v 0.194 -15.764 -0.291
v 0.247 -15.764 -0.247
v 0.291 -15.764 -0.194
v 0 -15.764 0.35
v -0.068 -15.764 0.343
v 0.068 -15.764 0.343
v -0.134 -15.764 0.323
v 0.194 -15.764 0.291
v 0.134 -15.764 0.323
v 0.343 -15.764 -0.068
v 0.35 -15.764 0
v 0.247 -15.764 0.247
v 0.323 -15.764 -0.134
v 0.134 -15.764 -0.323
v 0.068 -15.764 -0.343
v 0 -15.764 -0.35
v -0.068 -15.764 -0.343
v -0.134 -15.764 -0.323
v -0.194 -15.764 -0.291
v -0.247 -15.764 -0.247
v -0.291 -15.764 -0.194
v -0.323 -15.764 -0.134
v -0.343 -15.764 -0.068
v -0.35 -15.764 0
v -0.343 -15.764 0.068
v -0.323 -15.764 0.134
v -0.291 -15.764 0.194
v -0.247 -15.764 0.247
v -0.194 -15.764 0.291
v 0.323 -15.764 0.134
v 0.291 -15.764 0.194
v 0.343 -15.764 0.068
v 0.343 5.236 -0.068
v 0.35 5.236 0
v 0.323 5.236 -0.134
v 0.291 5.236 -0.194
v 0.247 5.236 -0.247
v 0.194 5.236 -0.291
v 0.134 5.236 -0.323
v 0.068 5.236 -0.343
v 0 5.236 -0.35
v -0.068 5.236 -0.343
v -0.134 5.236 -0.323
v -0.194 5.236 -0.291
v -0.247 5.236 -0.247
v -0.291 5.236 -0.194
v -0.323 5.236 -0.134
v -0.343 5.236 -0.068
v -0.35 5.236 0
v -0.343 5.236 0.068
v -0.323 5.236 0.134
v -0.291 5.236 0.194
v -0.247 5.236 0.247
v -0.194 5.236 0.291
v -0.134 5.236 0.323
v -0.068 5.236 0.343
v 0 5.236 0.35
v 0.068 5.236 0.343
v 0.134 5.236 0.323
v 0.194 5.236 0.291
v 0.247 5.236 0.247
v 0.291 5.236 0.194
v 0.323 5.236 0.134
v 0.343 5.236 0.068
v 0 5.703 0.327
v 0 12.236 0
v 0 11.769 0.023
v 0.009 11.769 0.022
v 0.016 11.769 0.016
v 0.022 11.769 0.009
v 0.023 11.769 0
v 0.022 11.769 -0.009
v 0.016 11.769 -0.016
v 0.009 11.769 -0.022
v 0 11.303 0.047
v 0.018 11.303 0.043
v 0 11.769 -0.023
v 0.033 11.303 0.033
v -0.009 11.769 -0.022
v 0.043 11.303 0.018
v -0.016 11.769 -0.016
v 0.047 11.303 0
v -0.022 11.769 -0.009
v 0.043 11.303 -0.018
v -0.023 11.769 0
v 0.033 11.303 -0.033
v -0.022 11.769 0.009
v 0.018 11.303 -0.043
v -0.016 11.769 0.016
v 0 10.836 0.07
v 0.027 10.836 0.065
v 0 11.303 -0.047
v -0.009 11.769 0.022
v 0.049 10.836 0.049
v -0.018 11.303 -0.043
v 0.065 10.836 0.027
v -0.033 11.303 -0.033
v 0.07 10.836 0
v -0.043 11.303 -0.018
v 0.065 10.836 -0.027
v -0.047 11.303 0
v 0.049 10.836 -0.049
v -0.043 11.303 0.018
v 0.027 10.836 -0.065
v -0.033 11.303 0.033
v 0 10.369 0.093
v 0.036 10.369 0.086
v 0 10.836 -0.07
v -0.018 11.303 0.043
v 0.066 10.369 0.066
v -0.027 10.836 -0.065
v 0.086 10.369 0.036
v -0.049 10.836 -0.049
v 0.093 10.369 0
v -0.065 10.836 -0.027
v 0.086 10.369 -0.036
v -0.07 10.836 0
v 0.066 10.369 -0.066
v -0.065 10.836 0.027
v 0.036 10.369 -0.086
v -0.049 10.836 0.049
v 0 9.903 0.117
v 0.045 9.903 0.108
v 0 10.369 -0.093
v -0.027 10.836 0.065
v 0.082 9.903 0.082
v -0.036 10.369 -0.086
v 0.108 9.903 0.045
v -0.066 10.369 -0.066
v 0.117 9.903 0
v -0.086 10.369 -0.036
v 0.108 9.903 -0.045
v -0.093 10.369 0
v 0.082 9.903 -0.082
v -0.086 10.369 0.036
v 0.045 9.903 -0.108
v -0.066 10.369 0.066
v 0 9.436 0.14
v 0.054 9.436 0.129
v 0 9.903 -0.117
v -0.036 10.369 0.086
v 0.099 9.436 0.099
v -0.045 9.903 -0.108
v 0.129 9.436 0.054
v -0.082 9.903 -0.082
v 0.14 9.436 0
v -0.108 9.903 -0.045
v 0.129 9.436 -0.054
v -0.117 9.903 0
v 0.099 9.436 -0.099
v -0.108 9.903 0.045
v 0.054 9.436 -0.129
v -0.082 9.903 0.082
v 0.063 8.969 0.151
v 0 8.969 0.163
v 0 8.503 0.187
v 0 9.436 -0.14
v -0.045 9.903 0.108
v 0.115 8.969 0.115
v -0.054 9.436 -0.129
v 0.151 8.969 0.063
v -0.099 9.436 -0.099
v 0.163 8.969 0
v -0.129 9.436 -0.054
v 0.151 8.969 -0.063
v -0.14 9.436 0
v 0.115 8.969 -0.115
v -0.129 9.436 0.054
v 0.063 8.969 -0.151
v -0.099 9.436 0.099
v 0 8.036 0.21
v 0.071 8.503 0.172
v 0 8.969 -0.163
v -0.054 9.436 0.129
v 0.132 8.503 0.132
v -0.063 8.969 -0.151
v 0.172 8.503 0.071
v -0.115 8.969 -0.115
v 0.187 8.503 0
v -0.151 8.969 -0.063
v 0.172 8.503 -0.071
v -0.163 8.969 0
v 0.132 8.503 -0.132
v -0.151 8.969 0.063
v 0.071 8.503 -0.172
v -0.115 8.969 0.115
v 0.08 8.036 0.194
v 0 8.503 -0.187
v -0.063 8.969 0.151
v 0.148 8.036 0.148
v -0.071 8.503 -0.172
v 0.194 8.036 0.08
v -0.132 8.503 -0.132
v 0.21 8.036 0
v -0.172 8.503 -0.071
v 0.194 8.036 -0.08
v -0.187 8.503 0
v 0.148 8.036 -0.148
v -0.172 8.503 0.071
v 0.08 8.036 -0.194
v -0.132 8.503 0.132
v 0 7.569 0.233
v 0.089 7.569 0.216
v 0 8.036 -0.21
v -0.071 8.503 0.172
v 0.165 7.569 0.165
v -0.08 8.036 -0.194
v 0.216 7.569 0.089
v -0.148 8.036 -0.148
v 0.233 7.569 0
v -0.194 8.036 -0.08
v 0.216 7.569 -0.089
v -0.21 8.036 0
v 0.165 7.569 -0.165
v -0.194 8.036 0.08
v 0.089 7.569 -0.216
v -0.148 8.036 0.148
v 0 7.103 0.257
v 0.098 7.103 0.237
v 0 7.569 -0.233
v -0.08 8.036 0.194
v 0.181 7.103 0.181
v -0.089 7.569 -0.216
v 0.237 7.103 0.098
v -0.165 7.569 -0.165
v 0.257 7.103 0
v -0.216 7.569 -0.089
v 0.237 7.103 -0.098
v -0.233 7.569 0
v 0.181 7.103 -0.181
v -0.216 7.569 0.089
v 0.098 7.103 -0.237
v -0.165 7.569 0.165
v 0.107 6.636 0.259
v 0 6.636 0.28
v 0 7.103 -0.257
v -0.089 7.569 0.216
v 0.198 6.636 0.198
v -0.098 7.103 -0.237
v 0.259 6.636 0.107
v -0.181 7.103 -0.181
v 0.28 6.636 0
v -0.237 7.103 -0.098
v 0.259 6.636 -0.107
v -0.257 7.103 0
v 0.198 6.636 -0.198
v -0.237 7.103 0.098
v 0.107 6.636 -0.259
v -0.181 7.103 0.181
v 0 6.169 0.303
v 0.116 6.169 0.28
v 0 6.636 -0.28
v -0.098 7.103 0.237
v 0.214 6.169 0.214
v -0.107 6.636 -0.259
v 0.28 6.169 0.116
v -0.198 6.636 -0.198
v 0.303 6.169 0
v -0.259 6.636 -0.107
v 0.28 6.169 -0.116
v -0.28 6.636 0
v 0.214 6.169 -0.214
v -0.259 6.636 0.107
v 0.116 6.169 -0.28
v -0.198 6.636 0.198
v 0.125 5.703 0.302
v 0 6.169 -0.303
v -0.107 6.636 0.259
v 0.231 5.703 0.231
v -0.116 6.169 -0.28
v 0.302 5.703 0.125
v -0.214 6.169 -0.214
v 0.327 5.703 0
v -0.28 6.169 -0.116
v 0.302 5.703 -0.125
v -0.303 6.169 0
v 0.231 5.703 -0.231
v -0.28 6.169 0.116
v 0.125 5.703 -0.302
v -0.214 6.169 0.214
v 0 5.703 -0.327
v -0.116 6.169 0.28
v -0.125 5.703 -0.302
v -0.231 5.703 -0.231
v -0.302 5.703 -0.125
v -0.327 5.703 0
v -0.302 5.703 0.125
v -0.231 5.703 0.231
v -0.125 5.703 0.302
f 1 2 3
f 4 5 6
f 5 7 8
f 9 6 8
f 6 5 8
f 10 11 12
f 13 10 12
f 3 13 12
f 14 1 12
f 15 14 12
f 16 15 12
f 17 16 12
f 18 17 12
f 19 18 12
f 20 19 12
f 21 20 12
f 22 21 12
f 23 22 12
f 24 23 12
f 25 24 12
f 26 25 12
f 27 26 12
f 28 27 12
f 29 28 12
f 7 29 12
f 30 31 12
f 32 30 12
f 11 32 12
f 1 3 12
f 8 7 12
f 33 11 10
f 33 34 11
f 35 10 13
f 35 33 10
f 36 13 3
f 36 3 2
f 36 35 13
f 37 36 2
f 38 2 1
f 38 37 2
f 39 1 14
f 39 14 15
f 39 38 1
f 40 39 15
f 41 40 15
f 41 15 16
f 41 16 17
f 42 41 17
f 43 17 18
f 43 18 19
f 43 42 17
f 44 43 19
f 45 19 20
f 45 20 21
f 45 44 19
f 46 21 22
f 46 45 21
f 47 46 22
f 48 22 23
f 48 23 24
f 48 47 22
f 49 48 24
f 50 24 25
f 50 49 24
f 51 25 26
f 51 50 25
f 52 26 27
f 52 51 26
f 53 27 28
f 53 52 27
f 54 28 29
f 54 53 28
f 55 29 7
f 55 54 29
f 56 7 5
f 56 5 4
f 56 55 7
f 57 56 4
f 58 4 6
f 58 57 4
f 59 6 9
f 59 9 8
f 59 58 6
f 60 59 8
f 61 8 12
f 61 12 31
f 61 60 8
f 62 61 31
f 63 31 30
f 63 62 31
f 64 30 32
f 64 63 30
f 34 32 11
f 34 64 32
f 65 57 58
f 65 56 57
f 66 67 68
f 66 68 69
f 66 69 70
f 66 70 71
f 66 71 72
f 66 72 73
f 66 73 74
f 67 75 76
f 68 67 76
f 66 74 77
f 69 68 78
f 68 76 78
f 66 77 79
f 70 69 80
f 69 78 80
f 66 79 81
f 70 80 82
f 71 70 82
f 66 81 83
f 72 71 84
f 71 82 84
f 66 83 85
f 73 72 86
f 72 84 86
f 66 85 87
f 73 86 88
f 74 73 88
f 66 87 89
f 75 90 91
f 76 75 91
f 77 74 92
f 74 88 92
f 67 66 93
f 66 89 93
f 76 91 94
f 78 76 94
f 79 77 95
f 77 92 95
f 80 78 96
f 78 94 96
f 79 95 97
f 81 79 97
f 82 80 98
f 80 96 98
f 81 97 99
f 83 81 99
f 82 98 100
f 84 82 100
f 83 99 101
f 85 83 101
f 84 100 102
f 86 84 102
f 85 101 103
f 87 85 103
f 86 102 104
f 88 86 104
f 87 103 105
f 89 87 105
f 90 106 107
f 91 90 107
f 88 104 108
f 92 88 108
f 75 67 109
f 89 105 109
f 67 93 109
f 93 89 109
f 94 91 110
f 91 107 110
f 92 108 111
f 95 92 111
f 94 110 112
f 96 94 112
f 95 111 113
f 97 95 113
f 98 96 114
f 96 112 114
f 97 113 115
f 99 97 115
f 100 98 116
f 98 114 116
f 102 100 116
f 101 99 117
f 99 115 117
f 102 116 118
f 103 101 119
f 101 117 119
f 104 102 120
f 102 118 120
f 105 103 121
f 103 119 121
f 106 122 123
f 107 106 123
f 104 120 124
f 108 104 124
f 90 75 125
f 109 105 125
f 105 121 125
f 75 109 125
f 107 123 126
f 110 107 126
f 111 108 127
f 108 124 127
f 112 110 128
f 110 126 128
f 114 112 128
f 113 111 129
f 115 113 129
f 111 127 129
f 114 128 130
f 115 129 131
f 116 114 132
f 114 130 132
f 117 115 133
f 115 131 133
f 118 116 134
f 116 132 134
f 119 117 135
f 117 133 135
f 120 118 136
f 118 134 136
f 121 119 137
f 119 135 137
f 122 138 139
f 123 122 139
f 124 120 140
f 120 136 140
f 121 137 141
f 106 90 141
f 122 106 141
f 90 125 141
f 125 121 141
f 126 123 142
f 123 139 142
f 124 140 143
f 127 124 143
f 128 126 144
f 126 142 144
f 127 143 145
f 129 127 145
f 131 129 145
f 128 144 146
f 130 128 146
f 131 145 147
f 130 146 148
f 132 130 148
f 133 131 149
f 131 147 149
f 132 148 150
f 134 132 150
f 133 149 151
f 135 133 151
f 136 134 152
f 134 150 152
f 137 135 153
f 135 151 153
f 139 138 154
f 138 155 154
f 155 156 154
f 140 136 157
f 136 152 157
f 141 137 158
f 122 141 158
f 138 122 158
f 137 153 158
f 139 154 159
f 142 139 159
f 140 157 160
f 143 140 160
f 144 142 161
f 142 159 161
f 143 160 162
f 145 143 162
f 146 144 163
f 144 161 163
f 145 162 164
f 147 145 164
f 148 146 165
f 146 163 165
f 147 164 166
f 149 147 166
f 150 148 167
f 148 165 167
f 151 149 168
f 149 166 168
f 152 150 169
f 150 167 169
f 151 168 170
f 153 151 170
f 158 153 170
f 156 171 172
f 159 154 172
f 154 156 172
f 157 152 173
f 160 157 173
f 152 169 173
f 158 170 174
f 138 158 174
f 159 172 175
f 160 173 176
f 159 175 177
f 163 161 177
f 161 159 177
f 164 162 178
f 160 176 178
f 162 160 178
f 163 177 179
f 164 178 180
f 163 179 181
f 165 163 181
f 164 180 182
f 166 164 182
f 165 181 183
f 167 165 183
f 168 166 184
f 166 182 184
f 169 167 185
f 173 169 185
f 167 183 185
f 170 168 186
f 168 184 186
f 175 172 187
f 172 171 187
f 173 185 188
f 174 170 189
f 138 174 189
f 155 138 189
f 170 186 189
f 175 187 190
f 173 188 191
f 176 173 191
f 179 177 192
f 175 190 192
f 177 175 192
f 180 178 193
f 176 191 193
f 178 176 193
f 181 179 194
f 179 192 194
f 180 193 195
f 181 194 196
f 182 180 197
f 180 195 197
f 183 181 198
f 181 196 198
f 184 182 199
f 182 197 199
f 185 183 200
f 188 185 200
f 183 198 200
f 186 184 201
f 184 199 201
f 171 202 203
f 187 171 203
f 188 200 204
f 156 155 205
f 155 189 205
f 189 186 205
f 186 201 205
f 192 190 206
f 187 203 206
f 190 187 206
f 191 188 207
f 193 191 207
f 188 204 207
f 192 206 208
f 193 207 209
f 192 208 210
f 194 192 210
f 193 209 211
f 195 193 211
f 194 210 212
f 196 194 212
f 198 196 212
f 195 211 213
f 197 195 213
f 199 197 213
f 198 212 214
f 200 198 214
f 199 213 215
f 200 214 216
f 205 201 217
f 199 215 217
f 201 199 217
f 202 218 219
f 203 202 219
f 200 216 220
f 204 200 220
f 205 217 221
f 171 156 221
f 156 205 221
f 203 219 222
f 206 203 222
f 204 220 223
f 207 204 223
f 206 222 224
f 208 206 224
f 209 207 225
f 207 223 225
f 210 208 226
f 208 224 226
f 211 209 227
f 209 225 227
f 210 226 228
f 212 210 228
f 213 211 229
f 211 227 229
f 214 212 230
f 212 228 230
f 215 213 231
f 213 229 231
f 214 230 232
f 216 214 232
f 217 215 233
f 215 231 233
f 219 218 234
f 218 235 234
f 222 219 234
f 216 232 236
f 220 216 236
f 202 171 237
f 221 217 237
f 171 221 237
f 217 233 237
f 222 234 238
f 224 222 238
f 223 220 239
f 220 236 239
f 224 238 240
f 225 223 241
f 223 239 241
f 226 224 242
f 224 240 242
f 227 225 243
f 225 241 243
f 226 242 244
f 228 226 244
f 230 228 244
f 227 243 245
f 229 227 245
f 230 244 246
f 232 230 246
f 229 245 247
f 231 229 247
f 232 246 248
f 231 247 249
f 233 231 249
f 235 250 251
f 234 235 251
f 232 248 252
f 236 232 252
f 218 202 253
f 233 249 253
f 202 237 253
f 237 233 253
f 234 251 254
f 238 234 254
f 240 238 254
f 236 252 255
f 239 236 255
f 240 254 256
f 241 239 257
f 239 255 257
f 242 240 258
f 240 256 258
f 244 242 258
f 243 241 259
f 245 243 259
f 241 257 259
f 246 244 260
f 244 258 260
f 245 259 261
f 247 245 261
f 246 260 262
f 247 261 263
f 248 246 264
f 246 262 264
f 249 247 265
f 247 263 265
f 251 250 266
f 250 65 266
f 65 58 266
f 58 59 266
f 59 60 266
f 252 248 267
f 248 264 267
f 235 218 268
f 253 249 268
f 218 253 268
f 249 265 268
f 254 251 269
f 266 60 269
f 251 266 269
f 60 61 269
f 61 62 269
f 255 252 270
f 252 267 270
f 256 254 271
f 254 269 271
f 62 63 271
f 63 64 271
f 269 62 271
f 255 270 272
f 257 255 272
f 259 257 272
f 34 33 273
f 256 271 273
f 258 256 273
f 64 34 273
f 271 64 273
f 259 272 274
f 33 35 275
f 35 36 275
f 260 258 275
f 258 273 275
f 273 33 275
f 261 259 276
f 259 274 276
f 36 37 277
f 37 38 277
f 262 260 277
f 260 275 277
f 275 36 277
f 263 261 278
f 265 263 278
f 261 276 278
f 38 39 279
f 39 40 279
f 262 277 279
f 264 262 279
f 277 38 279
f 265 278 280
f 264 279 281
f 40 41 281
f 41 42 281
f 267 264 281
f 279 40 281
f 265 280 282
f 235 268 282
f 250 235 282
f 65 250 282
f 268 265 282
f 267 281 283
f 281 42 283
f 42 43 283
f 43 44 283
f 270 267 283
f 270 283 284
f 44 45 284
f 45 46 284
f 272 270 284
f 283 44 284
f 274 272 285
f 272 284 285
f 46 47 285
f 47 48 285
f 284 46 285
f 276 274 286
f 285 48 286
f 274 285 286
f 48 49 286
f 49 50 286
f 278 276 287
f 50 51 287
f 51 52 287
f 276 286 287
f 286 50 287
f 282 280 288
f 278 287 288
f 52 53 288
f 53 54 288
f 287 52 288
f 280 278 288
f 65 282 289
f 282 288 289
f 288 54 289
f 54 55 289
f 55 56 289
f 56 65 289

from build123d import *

# Parameters (mm, degrees)
SKETCH_1_R    = 0.5
SCALE_1_SCALE = 0.7


with BuildPart() as part:
    # По траектории1: sweep along a path in Эскиз2
    with BuildLine(Plane.XY) as sweep_1_path:
        Line((0, -20.788855077), (0, 9.211144923))
    # Эскиз1 → По траектории1 (sweep)
    with BuildSketch(Plane(origin=(0, 0, 0), x_dir=(1, 0, 0), z_dir=(0, 1, 0))):
        Circle(SKETCH_1_R)
    sweep(path=sweep_1_path.line)

    # Эскиз5 → Повернуть1 (revolve)
    with BuildSketch(Plane(origin=(0, 0, 0), x_dir=(0, 0, -1), z_dir=(1, 0, 0)), mode=Mode.PRIVATE) as revolve_1_sk:
        Polygon((0, 19.211144923), (0.5, 9.211144923), (0, 9.211144923), align=None)
    revolve(revolve_1_sk.sketch.rotate(Axis((0, 9.211144923, 0), (0, 1, 0)), 180), axis=Axis((0, 9.211144923, 0), (0, 1, 0)))


with BuildPart() as part_1:
    # Масштаб1: scaled about (0, -4.038855077, 0)
    add(part.part.scale(SCALE_1_SCALE).moved(Location((0, -1.211656523, 0))))


solid = part_1.part
